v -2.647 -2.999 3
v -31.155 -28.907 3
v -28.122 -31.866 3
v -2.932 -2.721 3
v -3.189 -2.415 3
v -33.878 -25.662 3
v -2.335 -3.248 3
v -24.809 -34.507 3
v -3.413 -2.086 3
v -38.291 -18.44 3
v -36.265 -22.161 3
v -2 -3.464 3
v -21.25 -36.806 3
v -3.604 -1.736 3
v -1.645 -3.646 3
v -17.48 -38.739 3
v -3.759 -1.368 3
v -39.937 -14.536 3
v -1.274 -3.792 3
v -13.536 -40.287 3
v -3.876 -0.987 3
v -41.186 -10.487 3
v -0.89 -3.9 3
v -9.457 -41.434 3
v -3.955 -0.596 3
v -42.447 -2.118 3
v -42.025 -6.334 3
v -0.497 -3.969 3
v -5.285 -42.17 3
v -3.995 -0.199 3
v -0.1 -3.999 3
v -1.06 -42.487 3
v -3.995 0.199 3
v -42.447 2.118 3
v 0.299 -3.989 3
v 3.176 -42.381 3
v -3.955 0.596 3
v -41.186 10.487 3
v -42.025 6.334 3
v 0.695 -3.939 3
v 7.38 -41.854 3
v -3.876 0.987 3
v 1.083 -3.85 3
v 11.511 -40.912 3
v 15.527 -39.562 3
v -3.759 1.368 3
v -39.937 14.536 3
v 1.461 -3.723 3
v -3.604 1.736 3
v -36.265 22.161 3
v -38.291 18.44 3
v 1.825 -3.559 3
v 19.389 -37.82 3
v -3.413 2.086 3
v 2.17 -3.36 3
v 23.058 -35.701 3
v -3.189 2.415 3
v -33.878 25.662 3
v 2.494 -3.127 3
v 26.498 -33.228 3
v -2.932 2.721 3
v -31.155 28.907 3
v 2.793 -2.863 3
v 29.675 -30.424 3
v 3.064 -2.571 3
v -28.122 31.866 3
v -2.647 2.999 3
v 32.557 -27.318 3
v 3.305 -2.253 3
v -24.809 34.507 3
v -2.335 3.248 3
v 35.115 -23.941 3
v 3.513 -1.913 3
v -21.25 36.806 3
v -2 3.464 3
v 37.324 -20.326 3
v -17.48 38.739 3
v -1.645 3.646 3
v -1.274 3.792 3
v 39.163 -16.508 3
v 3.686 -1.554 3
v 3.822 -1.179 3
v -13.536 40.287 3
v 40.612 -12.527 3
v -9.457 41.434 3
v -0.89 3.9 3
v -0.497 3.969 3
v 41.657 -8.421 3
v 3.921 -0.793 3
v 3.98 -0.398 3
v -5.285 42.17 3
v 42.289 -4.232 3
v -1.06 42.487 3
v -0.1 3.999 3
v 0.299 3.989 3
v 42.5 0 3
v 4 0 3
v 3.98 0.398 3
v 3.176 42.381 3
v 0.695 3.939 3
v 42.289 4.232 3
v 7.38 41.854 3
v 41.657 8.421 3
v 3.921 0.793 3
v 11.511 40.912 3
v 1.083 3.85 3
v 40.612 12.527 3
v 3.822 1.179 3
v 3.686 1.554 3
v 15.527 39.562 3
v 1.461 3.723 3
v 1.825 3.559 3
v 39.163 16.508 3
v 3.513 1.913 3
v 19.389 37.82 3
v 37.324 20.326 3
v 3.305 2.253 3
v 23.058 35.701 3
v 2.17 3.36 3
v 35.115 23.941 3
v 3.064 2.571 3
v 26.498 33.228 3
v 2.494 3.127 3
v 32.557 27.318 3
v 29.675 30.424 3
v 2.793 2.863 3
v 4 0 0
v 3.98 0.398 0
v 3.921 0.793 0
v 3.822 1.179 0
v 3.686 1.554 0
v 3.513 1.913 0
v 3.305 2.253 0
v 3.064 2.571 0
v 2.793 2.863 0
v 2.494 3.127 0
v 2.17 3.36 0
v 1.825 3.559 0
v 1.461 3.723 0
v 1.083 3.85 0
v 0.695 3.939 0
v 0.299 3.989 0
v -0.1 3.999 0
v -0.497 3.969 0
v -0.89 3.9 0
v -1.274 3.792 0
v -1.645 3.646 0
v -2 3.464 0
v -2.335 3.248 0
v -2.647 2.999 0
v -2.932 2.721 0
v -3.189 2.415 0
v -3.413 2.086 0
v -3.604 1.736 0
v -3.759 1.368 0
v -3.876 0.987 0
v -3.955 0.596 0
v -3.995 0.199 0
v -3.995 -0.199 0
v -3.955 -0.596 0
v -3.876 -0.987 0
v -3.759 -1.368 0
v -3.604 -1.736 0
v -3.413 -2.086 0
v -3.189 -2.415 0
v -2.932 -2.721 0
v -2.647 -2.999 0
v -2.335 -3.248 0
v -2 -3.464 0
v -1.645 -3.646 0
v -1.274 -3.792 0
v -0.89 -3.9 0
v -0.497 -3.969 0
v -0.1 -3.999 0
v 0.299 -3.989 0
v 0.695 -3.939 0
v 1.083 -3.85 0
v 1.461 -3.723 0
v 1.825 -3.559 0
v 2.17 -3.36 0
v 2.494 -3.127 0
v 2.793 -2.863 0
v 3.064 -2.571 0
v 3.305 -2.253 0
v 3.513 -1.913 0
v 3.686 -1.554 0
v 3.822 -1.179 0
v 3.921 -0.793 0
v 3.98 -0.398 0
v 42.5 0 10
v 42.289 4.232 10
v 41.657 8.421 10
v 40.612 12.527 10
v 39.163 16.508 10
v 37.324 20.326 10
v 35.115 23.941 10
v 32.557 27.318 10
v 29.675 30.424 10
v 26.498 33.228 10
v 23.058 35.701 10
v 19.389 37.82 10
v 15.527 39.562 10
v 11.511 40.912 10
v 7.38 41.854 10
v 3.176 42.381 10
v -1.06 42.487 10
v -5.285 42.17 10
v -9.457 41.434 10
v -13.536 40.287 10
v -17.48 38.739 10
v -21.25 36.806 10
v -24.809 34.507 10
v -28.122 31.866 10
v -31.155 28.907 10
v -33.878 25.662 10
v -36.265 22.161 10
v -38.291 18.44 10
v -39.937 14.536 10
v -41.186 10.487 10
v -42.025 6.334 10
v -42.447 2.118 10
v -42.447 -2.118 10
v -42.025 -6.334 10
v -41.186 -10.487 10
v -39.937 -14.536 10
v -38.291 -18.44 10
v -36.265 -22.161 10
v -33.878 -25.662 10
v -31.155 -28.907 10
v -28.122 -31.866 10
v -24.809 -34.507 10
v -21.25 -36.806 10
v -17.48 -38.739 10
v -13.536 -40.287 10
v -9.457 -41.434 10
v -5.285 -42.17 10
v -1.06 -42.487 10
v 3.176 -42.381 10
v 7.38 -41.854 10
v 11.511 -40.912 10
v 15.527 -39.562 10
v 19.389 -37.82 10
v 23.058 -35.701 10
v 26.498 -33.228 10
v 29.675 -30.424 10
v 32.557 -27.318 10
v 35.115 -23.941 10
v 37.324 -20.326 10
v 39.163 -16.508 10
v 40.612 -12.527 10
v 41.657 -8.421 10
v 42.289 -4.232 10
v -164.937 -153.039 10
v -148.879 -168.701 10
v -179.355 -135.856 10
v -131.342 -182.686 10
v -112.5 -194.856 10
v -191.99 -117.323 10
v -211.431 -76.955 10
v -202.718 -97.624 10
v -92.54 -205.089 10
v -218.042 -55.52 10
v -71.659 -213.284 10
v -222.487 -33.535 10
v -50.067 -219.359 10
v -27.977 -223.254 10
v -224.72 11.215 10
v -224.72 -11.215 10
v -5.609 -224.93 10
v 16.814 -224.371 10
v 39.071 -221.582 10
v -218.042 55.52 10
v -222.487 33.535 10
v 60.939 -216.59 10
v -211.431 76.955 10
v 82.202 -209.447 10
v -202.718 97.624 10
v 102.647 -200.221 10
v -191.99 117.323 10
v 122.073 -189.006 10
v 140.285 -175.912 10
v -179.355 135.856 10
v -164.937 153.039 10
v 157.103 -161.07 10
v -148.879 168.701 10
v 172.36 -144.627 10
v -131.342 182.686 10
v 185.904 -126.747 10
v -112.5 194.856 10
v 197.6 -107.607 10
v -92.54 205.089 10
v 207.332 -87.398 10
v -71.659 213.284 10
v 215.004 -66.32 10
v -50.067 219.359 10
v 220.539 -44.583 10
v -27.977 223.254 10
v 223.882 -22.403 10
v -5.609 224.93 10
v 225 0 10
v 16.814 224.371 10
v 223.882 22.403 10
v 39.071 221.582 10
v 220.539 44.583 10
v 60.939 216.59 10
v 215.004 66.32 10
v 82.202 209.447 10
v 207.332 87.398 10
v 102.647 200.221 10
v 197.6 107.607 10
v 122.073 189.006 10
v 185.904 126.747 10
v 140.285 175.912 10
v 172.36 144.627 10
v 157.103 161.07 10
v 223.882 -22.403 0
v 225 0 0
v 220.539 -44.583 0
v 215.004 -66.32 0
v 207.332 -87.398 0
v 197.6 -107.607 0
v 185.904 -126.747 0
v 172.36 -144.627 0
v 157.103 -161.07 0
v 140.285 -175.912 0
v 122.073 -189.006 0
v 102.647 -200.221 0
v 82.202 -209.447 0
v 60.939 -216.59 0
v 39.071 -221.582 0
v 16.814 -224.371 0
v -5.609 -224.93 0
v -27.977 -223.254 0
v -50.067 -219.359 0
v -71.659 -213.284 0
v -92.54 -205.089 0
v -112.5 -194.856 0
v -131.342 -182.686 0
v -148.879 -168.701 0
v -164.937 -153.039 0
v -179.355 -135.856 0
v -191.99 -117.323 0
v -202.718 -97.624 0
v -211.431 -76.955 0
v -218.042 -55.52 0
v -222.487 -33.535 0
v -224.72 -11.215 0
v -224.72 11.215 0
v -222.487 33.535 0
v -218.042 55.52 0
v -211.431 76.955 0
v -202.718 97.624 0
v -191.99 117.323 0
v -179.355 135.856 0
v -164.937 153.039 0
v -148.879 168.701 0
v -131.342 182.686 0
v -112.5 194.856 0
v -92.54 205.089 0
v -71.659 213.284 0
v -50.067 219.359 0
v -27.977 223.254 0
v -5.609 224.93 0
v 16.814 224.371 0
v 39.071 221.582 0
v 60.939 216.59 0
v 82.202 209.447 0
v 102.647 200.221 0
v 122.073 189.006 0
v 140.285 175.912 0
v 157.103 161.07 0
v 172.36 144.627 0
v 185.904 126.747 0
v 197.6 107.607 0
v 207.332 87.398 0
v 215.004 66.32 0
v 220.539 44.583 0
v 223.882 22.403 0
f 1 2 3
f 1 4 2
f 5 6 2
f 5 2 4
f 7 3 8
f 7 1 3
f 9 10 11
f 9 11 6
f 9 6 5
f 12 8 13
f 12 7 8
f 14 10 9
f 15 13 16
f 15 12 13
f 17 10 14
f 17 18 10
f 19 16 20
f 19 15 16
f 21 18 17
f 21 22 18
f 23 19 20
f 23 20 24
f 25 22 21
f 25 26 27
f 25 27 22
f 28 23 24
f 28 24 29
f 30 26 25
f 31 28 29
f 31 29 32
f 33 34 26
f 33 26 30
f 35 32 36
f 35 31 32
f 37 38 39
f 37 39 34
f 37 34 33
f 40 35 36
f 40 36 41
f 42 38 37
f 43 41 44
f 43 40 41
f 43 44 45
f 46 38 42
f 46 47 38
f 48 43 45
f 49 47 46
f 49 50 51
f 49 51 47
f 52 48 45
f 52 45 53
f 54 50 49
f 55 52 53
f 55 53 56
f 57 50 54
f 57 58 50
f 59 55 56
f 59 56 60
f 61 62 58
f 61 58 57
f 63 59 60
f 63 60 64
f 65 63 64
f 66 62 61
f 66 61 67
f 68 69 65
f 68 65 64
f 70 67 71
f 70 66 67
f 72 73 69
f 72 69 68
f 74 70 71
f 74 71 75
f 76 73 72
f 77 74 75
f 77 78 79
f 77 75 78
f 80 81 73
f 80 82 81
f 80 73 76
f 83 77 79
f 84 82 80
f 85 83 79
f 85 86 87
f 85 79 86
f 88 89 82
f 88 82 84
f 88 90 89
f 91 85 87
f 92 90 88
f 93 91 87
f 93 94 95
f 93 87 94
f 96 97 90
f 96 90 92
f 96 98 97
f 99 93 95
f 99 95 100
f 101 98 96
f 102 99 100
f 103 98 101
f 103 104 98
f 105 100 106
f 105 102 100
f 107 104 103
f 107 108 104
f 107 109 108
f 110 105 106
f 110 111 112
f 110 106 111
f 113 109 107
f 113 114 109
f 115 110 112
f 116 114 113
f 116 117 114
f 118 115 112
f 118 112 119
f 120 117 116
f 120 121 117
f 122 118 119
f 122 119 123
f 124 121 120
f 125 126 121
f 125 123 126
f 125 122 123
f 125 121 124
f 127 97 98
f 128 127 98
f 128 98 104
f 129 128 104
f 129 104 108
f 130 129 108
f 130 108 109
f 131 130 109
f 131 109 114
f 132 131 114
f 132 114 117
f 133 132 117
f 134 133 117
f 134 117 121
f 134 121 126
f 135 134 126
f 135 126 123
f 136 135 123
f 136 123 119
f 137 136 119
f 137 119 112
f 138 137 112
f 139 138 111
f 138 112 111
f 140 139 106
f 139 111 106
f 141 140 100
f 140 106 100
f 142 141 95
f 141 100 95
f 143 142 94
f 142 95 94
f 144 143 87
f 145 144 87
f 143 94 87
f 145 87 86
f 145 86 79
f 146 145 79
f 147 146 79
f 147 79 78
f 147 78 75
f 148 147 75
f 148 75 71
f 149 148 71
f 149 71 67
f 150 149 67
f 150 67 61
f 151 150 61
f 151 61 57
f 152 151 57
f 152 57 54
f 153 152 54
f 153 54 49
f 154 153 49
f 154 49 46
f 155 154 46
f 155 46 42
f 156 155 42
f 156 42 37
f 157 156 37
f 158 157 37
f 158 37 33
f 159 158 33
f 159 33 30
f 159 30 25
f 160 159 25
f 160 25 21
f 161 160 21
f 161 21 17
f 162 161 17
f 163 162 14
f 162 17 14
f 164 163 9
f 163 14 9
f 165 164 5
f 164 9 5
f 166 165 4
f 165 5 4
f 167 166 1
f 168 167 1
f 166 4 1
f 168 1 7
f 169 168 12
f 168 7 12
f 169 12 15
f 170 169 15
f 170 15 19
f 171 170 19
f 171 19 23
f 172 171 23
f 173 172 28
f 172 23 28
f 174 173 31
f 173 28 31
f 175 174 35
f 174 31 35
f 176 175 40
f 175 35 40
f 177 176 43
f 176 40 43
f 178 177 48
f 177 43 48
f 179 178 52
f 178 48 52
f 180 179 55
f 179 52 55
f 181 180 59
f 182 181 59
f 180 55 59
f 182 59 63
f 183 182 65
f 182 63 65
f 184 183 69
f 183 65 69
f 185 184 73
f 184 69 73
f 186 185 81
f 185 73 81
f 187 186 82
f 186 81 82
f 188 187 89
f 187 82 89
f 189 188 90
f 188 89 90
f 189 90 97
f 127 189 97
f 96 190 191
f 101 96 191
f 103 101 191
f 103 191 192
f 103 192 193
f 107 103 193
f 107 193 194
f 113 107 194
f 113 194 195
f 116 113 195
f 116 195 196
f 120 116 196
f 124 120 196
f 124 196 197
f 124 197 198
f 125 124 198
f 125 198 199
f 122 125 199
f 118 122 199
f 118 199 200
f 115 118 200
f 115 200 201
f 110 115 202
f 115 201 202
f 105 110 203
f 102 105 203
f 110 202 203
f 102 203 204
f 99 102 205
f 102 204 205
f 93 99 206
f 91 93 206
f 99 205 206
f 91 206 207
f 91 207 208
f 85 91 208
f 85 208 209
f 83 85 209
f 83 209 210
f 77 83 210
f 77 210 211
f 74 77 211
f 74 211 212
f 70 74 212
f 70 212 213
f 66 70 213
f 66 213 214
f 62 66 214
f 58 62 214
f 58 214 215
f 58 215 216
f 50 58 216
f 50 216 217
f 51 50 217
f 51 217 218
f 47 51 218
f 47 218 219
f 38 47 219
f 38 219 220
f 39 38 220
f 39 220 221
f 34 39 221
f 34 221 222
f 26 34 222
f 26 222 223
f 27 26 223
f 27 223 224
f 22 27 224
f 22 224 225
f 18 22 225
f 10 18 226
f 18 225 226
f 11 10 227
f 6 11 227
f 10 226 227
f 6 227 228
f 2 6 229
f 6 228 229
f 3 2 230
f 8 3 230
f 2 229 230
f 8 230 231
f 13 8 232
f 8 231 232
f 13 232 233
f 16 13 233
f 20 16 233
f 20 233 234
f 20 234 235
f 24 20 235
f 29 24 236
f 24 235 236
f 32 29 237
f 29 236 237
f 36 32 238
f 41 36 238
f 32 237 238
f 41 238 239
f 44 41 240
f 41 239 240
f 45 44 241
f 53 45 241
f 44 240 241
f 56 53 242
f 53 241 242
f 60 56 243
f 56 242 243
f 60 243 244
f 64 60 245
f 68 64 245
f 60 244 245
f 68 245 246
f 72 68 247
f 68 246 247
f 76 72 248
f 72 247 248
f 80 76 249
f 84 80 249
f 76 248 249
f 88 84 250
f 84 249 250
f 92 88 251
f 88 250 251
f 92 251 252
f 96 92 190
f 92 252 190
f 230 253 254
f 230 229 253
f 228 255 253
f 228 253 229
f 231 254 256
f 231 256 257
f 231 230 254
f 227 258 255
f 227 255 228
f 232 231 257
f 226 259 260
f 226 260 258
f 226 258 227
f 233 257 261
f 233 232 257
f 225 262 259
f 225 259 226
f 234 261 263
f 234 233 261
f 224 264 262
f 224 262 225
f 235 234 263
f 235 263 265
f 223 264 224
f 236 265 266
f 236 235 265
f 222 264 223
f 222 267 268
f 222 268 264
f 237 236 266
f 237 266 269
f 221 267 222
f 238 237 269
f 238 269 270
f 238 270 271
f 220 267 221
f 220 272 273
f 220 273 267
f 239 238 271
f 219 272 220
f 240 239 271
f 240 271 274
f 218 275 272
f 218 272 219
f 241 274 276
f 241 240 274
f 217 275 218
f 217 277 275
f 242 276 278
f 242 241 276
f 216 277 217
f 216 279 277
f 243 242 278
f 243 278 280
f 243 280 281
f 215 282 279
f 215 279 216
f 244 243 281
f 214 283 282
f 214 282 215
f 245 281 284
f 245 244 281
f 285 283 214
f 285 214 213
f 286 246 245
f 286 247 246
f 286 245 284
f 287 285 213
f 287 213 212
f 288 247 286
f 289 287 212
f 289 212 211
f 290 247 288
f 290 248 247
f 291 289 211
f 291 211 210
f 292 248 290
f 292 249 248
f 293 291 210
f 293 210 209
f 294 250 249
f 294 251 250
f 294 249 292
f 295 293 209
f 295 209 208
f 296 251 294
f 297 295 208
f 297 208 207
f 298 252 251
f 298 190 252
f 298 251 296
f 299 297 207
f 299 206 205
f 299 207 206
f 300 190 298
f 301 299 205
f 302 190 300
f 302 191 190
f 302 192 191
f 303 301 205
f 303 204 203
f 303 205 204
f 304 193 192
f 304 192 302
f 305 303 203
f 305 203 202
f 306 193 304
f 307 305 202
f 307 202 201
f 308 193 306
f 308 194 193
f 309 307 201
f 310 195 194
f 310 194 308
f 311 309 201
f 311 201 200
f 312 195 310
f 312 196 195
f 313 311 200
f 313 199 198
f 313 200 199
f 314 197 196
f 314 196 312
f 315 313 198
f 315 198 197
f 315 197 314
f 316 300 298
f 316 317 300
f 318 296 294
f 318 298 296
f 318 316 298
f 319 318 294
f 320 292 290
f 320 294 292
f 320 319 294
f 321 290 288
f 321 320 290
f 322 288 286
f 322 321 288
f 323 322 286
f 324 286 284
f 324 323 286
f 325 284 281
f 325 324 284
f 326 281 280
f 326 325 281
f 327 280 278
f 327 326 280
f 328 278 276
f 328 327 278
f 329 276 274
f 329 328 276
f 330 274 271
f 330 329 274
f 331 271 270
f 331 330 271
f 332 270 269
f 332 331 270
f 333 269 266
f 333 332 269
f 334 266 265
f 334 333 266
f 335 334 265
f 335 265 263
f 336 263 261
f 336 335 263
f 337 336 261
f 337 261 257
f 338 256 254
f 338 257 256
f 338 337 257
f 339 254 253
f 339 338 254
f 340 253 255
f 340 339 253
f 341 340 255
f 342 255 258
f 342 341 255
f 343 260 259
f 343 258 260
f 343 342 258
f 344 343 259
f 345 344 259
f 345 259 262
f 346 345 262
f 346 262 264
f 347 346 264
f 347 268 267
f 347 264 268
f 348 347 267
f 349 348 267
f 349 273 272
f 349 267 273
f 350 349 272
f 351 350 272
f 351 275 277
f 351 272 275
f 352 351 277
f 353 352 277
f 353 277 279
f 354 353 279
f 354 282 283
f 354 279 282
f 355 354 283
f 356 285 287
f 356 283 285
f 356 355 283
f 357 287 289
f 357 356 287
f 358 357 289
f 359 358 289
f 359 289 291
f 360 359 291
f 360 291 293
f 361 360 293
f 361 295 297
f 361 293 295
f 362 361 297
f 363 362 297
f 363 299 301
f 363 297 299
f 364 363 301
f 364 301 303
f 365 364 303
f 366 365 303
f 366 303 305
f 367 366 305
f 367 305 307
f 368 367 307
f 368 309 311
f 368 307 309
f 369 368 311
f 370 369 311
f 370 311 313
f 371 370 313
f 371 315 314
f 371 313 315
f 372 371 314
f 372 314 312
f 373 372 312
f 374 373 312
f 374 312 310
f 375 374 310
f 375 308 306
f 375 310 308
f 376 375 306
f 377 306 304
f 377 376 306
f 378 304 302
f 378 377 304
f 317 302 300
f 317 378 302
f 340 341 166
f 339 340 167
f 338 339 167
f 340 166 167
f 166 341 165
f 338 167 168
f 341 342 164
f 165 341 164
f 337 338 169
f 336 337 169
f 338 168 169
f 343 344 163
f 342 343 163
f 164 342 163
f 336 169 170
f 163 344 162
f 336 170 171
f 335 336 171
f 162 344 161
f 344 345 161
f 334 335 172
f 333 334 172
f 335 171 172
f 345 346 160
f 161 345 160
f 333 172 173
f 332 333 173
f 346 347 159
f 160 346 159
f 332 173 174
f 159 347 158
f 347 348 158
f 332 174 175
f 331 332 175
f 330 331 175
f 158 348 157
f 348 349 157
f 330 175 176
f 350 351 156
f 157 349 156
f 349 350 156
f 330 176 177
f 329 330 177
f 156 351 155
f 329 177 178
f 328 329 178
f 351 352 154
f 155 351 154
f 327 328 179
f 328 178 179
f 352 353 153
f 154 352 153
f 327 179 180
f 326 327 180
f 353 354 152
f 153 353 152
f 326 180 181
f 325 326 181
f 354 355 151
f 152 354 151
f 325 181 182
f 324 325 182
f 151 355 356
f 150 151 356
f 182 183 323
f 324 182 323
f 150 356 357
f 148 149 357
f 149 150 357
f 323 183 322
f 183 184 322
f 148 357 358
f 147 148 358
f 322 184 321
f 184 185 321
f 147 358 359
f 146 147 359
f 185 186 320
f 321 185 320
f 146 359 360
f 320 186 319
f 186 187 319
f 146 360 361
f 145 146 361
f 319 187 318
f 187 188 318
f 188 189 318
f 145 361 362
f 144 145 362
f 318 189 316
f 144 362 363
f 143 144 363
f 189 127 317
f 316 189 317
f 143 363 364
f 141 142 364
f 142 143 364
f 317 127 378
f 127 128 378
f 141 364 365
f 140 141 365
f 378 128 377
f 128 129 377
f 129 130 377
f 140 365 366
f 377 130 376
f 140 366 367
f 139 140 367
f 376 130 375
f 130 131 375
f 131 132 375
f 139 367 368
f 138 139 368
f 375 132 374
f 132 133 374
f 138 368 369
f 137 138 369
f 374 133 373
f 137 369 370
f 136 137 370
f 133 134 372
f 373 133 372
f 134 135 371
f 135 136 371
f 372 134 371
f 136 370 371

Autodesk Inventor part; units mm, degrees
ref_plane "YZ Plane" through (0, 0, 0) normal (1, 0, 0) x (0, 1, 0)
ref_plane "XZ Plane" through (0, 0, 0) normal (0, 1, 0) x (-1, 0, 0)
ref_plane "XY Plane" through (0, 0, 0) normal (0, 0, 1) x (1, 0, 0)
sketch "Sketch1" plane through (0, 0, 0) normal (0, 0, 1) x (1, 0, 0)
  circle A0 centre (0, 0) radius 225
  dimension "d0" = 450
extrude "Extrusion1" add sketch "Sketch1" along normal blind 10
sketch "Sketch2" plane through (0, 0, 10) normal (0, 0, 1) x (1, 0, 0)
  circle A0 centre (0, 0) radius 4
  dimension "d3" = 8
extrude "Extrusion2" cut sketch "Sketch2" against normal up to next
sketch "Sketch3" plane through (0, 0, 10) normal (0, 0, 1) x (1, 0, 0)
  circle A0 centre (0, 0) radius 4 projected
  circle A1 centre (0, 0) radius 42.5
  dimension "d6" = 85
extrude "Extrusion3" cut sketch "Sketch3" against normal blind 7
properties part number "DiscoAzimute" material "Nickel-Copper Alloy 400"
